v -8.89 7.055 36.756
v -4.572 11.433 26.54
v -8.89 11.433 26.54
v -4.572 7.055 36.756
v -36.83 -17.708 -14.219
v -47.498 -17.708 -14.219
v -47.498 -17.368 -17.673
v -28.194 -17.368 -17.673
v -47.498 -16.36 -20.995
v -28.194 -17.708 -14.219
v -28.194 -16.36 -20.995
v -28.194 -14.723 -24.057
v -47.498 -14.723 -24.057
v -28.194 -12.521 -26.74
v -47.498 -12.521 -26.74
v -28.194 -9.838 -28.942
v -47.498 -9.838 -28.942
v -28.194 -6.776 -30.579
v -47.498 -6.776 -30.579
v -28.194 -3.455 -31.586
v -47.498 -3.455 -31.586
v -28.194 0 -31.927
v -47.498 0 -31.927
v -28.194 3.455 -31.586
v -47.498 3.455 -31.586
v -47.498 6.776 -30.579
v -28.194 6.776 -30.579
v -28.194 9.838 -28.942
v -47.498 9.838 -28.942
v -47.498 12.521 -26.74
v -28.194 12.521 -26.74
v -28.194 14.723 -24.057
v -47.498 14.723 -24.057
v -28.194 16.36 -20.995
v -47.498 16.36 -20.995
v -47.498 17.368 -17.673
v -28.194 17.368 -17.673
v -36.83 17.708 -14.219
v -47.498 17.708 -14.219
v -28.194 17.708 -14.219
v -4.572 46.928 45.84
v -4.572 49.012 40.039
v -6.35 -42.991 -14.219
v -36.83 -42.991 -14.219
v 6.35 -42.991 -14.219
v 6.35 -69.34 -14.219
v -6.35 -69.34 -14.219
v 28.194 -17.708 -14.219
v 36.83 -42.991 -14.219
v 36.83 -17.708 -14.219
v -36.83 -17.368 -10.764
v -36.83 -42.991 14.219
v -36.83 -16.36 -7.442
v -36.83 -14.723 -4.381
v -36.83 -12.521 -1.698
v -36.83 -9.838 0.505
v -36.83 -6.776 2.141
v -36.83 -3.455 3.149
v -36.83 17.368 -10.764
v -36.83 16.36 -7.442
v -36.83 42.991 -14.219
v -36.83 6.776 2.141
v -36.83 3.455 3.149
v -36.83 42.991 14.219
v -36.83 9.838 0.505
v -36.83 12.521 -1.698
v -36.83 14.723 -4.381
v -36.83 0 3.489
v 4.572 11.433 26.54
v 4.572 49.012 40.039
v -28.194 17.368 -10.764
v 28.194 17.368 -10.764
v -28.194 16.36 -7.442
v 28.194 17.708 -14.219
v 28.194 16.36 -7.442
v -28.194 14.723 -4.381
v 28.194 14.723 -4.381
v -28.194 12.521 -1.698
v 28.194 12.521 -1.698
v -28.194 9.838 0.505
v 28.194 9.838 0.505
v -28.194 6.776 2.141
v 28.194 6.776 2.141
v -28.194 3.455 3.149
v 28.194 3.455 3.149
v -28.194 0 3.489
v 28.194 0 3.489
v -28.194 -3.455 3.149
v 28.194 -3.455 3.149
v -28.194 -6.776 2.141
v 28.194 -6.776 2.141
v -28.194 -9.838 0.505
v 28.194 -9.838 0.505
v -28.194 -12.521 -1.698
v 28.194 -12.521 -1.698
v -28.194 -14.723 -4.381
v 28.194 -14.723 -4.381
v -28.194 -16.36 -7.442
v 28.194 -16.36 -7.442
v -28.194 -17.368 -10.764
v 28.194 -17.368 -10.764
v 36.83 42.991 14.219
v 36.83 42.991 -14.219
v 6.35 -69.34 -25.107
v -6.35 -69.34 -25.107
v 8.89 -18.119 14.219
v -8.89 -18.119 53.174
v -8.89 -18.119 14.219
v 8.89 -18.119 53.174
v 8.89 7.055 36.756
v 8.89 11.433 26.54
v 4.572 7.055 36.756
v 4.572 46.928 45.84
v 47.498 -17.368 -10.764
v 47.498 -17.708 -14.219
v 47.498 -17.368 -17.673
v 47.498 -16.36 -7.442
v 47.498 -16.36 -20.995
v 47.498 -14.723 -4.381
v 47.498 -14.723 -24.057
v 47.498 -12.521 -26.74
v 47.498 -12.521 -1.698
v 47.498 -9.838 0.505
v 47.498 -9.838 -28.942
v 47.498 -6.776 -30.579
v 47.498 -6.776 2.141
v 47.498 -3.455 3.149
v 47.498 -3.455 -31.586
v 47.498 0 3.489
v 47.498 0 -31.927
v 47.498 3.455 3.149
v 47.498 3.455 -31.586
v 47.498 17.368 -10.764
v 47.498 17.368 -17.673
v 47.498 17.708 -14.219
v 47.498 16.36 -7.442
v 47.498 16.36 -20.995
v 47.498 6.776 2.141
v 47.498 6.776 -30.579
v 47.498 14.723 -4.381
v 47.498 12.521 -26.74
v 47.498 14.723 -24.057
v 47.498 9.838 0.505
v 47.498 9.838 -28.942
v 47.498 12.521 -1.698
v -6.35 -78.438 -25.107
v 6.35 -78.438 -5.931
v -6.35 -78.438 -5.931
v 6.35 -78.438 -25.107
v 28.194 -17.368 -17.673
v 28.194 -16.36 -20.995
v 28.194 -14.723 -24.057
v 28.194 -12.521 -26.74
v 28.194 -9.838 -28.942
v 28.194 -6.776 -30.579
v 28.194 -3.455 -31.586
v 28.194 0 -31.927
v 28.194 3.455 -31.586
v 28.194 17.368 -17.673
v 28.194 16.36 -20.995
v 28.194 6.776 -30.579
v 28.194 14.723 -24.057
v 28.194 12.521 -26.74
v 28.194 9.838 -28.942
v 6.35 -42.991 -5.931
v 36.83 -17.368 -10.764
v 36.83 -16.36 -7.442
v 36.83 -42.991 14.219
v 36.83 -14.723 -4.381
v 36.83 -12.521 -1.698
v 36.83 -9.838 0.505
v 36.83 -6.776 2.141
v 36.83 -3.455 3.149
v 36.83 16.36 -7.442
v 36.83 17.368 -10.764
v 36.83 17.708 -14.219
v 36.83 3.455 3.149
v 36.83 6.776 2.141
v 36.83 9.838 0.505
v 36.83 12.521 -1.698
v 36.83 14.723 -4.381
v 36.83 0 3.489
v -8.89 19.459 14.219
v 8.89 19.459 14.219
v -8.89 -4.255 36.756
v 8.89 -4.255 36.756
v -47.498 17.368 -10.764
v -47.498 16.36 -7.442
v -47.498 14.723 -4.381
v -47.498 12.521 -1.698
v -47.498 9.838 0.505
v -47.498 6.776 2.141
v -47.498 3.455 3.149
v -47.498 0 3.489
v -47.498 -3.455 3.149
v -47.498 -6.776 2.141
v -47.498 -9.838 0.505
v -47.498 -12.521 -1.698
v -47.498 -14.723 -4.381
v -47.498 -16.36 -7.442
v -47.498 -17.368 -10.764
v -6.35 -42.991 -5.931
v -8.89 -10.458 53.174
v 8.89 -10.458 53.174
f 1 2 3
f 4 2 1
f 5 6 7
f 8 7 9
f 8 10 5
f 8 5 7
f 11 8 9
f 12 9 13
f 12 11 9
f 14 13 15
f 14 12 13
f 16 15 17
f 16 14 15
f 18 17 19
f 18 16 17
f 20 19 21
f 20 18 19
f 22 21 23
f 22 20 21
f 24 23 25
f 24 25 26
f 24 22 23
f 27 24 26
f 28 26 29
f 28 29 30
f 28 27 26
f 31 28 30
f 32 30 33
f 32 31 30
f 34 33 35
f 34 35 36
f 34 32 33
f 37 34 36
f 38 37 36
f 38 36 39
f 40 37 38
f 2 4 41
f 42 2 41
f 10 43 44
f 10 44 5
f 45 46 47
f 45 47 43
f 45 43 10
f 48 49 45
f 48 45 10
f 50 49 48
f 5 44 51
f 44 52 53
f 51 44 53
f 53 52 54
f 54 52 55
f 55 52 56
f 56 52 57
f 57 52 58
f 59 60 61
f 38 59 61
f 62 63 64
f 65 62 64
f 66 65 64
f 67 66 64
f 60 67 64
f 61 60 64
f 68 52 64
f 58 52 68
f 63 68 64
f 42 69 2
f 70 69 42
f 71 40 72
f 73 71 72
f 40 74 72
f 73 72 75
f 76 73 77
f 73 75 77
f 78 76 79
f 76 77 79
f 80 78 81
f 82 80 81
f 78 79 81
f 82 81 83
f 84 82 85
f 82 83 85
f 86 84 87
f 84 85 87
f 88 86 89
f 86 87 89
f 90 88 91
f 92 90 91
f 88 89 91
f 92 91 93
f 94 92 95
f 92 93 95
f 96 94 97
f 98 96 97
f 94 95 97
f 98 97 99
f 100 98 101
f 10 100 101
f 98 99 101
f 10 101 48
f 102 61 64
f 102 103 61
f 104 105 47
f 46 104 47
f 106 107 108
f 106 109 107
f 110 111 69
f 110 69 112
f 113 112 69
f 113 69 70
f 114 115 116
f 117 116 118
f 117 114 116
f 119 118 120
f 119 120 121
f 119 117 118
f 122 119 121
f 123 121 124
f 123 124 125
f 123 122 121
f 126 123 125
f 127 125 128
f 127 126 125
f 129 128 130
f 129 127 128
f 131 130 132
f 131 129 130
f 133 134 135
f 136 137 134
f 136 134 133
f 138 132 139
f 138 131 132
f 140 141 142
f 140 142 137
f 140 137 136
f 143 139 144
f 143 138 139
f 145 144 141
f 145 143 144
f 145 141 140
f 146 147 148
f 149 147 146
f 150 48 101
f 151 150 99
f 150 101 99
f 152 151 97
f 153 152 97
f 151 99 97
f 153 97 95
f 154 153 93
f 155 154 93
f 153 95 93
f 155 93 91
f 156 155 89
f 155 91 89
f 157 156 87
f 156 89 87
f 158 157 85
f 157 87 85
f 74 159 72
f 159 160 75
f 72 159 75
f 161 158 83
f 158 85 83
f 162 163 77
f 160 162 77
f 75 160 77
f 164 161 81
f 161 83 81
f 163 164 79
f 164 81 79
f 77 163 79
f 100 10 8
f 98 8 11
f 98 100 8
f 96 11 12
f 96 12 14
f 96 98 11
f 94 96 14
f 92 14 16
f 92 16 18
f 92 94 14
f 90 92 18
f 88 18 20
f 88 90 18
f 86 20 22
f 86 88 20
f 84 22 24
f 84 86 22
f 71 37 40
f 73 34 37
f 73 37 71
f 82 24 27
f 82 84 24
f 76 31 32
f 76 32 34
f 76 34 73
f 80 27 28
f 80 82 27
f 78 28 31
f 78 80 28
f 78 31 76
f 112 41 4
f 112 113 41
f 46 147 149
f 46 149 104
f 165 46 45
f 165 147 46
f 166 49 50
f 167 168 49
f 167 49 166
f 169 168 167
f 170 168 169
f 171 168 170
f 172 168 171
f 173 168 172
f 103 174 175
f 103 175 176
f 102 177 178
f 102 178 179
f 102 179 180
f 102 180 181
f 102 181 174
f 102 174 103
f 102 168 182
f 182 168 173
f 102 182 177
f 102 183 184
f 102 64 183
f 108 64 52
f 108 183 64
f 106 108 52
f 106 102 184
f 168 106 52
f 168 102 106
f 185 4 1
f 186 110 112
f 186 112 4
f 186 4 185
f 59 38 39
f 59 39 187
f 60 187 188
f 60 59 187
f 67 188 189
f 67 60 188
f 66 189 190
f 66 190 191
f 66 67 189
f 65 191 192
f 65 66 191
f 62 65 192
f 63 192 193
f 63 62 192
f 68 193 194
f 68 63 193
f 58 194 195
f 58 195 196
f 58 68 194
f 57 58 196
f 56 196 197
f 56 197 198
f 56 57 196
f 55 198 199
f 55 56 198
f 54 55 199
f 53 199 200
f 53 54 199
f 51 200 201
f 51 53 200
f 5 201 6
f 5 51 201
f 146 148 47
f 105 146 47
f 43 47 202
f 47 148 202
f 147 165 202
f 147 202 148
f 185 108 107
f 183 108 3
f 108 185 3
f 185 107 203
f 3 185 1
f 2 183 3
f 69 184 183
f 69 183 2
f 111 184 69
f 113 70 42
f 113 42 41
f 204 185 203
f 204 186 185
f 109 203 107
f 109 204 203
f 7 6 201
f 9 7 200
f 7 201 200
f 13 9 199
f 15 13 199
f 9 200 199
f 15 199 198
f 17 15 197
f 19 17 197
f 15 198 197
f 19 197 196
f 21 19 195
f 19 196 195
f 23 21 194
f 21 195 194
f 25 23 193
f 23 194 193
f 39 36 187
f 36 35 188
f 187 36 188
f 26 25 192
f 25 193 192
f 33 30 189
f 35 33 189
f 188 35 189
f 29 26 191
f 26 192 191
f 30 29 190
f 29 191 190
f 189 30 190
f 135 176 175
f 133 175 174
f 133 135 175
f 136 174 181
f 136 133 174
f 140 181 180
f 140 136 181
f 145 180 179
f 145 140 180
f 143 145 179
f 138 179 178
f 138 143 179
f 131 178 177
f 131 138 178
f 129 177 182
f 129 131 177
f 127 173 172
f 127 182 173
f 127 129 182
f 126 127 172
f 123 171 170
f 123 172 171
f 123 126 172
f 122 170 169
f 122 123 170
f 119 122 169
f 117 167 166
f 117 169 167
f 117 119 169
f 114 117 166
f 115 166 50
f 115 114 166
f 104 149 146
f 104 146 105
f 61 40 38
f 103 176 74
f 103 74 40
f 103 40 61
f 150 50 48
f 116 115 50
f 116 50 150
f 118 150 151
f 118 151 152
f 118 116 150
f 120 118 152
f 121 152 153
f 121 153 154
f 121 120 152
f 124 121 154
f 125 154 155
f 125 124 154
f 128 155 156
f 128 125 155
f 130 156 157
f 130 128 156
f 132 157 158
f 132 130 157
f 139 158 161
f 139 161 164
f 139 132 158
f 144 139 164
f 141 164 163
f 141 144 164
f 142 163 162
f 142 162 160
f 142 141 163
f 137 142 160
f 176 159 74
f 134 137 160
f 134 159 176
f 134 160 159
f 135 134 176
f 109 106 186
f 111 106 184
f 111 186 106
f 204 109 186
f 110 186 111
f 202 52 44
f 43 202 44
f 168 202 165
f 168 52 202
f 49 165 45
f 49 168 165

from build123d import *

# Parameters (mm, degrees)
F1_DEPTH = 36.83
F2_DEPTH = 47.498
F3_DEPTH = 28.194
F4_DEPTH = 8.89
F5_DEPTH = 4.572
F6_DEPTH = 6.35
F7_W     = 33.954457
F7_H     = 11.318151
F8_DEPTH = 12.7


with BuildPart() as f1:
    # F0 (on Right) → F1 (new body, symmetric)
    with BuildSketch(Plane.YZ):
        with BuildLine():
            Line((-18.119462, 14.21879), (-42.990837, 14.21879))
            Line((-42.990837, 14.21879), (-42.990837, -5.931014))
            Line((-42.990837, -5.931014), (-42.990837, -14.21879))
            Line((-42.990837, -14.21879), (-17.70777, -14.21879))
            ThreePointArc((-17.70777, -14.21879), (0, 3.48898), (17.70777, -14.21879))
            Line((17.70777, -14.21879), (42.990837, -14.21879))
            Line((42.990837, -14.21879), (42.990837, 14.21879))
            Line((42.990837, 14.21879), (19.459361, 14.21879))
            Line((19.459361, 14.21879), (-18.119462, 14.21879))
        make_face()
    extrude(amount=F1_DEPTH, both=True)

    # F0 (on Right) → F2 (join, symmetric)
    with BuildSketch(Plane.YZ):
        with BuildLine():
            ThreePointArc((17.70777, -14.21879), (0, 3.48898), (-17.70777, -14.21879))
            ThreePointArc((-17.70777, -14.21879), (0, -31.926559), (17.70777, -14.21879))
        make_face()
    extrude(amount=F2_DEPTH, both=True)

    # F0 (on Right) → F3 (cut, symmetric)
    with BuildSketch(Plane.YZ):
        with BuildLine():
            ThreePointArc((17.70777, -14.21879), (0, 3.48898), (-17.70777, -14.21879))
            ThreePointArc((-17.70777, -14.21879), (0, -31.926559), (17.70777, -14.21879))
        make_face()
    extrude(amount=F3_DEPTH, both=True, mode=Mode.SUBTRACT)

    # F0 (on Right) → F4 (join, symmetric)
    with BuildSketch(Plane.YZ):
        Polygon((-18.119462, 53.173751), (-18.119462, 14.21879), (19.459361, 14.21879), (11.432814, 26.540214), (7.054701, 36.755815), (-4.25543, 36.755815), (-10.457761, 53.173751), align=None)
    extrude(amount=F4_DEPTH, both=True)

    # F0 (on Right) → F5 (join, symmetric)
    with BuildSketch(Plane.YZ):
        Polygon((7.054701, 36.755815), (11.432814, 26.540214), (49.011637, 40.039402), (46.927817, 45.840306), align=None)
    extrude(amount=F5_DEPTH, both=True)

    # F0 (on Right) → F6 (join, symmetric)
    with BuildSketch(Plane.YZ):
        Polygon((-42.990837, -14.21879), (-42.990837, -5.931014), (-78.437544, -5.931014), (-78.437544, -14.21879), (-69.339758, -14.21879), align=None)
        Polygon((-69.339758, -31.358585), (-69.339758, -14.21879), (-78.437544, -14.21879), (-78.437544, -31.283986), align=None)
    extrude(amount=F6_DEPTH, both=True)

    # F7 (on Right) → F8 (cut, symmetric)
    with BuildSketch(Plane.YZ):
        with Locations((-71.897797, -30.766496)):
            Rectangle(F7_W, F7_H)
    extrude(amount=F8_DEPTH, both=True, mode=Mode.SUBTRACT)


solid = f1.part
